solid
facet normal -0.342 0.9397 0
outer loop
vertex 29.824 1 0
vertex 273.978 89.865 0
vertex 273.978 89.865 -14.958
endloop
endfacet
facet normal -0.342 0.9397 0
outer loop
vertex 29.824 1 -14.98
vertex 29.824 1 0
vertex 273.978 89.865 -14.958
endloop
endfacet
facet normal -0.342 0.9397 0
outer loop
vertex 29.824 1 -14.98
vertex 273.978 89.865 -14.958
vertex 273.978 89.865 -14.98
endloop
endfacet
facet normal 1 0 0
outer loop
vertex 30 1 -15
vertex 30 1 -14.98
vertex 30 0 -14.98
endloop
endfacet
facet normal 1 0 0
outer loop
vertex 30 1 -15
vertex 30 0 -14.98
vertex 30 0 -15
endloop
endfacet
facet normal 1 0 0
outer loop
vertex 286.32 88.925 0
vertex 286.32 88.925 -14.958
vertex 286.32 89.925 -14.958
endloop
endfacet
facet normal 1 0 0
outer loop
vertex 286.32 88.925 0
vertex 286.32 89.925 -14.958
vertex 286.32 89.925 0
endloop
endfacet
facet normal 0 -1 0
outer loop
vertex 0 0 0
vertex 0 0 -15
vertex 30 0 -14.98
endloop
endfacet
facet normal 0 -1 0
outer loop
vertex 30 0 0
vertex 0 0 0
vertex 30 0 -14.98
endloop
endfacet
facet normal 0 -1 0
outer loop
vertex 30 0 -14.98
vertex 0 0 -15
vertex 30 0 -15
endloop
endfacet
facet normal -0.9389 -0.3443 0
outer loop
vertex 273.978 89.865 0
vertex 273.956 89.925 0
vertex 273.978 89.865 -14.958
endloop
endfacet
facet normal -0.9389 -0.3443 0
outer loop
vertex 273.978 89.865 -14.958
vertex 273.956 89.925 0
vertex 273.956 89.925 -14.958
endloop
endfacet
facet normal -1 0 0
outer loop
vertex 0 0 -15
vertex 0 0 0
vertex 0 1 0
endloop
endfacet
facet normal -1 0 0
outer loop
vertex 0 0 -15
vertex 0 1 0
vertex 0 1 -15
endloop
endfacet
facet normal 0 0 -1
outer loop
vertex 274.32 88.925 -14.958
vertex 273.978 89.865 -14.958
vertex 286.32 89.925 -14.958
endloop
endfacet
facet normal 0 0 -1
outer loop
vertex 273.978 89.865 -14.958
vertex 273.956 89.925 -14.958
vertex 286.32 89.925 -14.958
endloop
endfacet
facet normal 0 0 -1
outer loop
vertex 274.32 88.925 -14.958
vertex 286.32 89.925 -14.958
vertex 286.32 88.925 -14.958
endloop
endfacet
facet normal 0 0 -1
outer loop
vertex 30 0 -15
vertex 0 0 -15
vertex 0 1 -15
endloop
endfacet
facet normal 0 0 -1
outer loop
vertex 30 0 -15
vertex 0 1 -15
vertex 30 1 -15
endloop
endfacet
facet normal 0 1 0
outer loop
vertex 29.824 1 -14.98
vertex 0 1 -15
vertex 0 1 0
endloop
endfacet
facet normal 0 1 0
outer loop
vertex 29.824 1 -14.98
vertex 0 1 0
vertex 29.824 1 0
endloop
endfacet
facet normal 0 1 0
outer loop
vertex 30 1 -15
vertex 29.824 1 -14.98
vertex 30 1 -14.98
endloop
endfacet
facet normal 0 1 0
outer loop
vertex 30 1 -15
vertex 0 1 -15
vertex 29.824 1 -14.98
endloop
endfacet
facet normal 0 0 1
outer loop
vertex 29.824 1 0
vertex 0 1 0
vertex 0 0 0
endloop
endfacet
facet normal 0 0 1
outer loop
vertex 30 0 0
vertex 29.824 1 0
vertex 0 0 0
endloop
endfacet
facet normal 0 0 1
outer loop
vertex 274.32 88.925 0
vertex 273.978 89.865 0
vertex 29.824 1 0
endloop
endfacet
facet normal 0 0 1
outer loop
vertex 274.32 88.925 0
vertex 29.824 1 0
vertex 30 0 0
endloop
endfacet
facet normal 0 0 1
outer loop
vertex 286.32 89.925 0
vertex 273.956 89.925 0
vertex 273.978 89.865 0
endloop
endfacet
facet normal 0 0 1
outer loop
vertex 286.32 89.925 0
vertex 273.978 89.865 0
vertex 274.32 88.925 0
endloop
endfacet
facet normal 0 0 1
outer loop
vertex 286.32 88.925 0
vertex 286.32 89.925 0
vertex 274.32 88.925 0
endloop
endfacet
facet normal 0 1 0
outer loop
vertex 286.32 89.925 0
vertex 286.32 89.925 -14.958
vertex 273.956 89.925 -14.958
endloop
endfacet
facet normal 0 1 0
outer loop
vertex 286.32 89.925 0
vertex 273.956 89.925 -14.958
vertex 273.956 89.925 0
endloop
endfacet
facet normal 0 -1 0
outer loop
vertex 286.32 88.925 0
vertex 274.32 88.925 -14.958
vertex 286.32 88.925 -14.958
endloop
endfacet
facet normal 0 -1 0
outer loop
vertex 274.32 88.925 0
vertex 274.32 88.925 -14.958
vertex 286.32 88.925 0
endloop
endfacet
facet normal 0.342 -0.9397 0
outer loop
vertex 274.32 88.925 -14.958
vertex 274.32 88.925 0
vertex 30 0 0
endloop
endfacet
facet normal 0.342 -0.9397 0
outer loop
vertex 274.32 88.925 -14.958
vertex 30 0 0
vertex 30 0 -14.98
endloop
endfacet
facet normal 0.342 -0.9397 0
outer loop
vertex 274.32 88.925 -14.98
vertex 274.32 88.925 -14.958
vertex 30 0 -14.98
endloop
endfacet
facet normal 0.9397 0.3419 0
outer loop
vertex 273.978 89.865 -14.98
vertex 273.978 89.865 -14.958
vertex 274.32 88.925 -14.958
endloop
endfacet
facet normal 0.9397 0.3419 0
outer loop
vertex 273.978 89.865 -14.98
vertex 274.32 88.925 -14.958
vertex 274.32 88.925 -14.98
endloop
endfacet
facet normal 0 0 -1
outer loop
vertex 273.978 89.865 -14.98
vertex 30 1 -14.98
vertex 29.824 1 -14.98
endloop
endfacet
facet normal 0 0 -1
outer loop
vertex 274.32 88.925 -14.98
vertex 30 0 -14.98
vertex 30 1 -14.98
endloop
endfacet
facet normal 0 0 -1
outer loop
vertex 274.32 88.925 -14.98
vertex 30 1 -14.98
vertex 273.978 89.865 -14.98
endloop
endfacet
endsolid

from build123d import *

# Parameters (mm, degrees)
SKETCH2_W                       = 30
SKETCH2_H                       = 15
BOSS_EXTRUDE1_DEPTH             = 1
SKETCH4_W                       = 14.98037952
SKETCH4_H                       = 260
BOSS_EXTRUDE2_DEPTH             = 1
SKETCH6_W                       = 14.958437981
SKETCH6_H                       = 1
BOSS_EXTRUDE3_DEPTH             = 12
BOSS_EXTRUDE3_DIRECTION_2_REACH = 291.054


with BuildPart() as part:
    # Sketch2 → Boss-Extrude1 (new body)
    with BuildSketch(Plane(origin=(0, 0, 0), x_dir=(1, 0, 0), z_dir=(0, 1, 0))):
        with Locations((15, 7.5)):
            Rectangle(SKETCH2_W, SKETCH2_H)
    extrude(amount=BOSS_EXTRUDE1_DEPTH)

    # Sketch4 → Boss-Extrude2 (add)
    with BuildSketch(Plane(origin=(3.509333353, -9.641814145, 0), x_dir=(0, 0, -1), z_dir=(0.34202014332566616, -0.9396926207859094, 0))):
        with Locations((7.49018976, 158.190778624)):
            Rectangle(SKETCH4_W, SKETCH4_H)
    extrude(amount=-BOSS_EXTRUDE2_DEPTH)

    # Sketch6 → Boss-Extrude3 (add)
    with BuildSketch(Plane(origin=(274.320081404, 0, 0), x_dir=(0, 0, 1), z_dir=(1, 0, 0))):
        with Locations((-7.479218991, -89.425237265)):
            Rectangle(SKETCH6_W, SKETCH6_H)
    extrude(amount=BOSS_EXTRUDE3_DEPTH)

    # Boss-Extrude3 direction 2: up to this face of the body (flat: up to its plane)
    boss_extrude3_direction_2_end = Plane(part.part.faces().sort_by_distance((274.149071333, 89.395083575, -7.49018976))[0])
    # Sketch6 → Boss-Extrude3 direction 2 (add, up to the picked face)
    with BuildSketch(Plane(origin=(274.320081404, 0, 0), x_dir=(0, 0, 1), z_dir=(1, 0, 0)), mode=Mode.PRIVATE) as boss_extrude3_direction_2_sk1:
        with Locations((-7.479218991, -89.425237265)):
            Rectangle(SKETCH6_W, SKETCH6_H)
    boss_extrude3_direction_2_tool1 = split(extrude(boss_extrude3_direction_2_sk1.sketch, amount=-BOSS_EXTRUDE3_DIRECTION_2_REACH, mode=Mode.PRIVATE), bisect_by=boss_extrude3_direction_2_end, keep=Keep.BOTH, mode=Mode.PRIVATE)
    add(boss_extrude3_direction_2_tool1.solids().sort_by(Axis((274.320081, 89.425237, -7.479219), (-1, 0, 0)))[0])


solid = part.part
